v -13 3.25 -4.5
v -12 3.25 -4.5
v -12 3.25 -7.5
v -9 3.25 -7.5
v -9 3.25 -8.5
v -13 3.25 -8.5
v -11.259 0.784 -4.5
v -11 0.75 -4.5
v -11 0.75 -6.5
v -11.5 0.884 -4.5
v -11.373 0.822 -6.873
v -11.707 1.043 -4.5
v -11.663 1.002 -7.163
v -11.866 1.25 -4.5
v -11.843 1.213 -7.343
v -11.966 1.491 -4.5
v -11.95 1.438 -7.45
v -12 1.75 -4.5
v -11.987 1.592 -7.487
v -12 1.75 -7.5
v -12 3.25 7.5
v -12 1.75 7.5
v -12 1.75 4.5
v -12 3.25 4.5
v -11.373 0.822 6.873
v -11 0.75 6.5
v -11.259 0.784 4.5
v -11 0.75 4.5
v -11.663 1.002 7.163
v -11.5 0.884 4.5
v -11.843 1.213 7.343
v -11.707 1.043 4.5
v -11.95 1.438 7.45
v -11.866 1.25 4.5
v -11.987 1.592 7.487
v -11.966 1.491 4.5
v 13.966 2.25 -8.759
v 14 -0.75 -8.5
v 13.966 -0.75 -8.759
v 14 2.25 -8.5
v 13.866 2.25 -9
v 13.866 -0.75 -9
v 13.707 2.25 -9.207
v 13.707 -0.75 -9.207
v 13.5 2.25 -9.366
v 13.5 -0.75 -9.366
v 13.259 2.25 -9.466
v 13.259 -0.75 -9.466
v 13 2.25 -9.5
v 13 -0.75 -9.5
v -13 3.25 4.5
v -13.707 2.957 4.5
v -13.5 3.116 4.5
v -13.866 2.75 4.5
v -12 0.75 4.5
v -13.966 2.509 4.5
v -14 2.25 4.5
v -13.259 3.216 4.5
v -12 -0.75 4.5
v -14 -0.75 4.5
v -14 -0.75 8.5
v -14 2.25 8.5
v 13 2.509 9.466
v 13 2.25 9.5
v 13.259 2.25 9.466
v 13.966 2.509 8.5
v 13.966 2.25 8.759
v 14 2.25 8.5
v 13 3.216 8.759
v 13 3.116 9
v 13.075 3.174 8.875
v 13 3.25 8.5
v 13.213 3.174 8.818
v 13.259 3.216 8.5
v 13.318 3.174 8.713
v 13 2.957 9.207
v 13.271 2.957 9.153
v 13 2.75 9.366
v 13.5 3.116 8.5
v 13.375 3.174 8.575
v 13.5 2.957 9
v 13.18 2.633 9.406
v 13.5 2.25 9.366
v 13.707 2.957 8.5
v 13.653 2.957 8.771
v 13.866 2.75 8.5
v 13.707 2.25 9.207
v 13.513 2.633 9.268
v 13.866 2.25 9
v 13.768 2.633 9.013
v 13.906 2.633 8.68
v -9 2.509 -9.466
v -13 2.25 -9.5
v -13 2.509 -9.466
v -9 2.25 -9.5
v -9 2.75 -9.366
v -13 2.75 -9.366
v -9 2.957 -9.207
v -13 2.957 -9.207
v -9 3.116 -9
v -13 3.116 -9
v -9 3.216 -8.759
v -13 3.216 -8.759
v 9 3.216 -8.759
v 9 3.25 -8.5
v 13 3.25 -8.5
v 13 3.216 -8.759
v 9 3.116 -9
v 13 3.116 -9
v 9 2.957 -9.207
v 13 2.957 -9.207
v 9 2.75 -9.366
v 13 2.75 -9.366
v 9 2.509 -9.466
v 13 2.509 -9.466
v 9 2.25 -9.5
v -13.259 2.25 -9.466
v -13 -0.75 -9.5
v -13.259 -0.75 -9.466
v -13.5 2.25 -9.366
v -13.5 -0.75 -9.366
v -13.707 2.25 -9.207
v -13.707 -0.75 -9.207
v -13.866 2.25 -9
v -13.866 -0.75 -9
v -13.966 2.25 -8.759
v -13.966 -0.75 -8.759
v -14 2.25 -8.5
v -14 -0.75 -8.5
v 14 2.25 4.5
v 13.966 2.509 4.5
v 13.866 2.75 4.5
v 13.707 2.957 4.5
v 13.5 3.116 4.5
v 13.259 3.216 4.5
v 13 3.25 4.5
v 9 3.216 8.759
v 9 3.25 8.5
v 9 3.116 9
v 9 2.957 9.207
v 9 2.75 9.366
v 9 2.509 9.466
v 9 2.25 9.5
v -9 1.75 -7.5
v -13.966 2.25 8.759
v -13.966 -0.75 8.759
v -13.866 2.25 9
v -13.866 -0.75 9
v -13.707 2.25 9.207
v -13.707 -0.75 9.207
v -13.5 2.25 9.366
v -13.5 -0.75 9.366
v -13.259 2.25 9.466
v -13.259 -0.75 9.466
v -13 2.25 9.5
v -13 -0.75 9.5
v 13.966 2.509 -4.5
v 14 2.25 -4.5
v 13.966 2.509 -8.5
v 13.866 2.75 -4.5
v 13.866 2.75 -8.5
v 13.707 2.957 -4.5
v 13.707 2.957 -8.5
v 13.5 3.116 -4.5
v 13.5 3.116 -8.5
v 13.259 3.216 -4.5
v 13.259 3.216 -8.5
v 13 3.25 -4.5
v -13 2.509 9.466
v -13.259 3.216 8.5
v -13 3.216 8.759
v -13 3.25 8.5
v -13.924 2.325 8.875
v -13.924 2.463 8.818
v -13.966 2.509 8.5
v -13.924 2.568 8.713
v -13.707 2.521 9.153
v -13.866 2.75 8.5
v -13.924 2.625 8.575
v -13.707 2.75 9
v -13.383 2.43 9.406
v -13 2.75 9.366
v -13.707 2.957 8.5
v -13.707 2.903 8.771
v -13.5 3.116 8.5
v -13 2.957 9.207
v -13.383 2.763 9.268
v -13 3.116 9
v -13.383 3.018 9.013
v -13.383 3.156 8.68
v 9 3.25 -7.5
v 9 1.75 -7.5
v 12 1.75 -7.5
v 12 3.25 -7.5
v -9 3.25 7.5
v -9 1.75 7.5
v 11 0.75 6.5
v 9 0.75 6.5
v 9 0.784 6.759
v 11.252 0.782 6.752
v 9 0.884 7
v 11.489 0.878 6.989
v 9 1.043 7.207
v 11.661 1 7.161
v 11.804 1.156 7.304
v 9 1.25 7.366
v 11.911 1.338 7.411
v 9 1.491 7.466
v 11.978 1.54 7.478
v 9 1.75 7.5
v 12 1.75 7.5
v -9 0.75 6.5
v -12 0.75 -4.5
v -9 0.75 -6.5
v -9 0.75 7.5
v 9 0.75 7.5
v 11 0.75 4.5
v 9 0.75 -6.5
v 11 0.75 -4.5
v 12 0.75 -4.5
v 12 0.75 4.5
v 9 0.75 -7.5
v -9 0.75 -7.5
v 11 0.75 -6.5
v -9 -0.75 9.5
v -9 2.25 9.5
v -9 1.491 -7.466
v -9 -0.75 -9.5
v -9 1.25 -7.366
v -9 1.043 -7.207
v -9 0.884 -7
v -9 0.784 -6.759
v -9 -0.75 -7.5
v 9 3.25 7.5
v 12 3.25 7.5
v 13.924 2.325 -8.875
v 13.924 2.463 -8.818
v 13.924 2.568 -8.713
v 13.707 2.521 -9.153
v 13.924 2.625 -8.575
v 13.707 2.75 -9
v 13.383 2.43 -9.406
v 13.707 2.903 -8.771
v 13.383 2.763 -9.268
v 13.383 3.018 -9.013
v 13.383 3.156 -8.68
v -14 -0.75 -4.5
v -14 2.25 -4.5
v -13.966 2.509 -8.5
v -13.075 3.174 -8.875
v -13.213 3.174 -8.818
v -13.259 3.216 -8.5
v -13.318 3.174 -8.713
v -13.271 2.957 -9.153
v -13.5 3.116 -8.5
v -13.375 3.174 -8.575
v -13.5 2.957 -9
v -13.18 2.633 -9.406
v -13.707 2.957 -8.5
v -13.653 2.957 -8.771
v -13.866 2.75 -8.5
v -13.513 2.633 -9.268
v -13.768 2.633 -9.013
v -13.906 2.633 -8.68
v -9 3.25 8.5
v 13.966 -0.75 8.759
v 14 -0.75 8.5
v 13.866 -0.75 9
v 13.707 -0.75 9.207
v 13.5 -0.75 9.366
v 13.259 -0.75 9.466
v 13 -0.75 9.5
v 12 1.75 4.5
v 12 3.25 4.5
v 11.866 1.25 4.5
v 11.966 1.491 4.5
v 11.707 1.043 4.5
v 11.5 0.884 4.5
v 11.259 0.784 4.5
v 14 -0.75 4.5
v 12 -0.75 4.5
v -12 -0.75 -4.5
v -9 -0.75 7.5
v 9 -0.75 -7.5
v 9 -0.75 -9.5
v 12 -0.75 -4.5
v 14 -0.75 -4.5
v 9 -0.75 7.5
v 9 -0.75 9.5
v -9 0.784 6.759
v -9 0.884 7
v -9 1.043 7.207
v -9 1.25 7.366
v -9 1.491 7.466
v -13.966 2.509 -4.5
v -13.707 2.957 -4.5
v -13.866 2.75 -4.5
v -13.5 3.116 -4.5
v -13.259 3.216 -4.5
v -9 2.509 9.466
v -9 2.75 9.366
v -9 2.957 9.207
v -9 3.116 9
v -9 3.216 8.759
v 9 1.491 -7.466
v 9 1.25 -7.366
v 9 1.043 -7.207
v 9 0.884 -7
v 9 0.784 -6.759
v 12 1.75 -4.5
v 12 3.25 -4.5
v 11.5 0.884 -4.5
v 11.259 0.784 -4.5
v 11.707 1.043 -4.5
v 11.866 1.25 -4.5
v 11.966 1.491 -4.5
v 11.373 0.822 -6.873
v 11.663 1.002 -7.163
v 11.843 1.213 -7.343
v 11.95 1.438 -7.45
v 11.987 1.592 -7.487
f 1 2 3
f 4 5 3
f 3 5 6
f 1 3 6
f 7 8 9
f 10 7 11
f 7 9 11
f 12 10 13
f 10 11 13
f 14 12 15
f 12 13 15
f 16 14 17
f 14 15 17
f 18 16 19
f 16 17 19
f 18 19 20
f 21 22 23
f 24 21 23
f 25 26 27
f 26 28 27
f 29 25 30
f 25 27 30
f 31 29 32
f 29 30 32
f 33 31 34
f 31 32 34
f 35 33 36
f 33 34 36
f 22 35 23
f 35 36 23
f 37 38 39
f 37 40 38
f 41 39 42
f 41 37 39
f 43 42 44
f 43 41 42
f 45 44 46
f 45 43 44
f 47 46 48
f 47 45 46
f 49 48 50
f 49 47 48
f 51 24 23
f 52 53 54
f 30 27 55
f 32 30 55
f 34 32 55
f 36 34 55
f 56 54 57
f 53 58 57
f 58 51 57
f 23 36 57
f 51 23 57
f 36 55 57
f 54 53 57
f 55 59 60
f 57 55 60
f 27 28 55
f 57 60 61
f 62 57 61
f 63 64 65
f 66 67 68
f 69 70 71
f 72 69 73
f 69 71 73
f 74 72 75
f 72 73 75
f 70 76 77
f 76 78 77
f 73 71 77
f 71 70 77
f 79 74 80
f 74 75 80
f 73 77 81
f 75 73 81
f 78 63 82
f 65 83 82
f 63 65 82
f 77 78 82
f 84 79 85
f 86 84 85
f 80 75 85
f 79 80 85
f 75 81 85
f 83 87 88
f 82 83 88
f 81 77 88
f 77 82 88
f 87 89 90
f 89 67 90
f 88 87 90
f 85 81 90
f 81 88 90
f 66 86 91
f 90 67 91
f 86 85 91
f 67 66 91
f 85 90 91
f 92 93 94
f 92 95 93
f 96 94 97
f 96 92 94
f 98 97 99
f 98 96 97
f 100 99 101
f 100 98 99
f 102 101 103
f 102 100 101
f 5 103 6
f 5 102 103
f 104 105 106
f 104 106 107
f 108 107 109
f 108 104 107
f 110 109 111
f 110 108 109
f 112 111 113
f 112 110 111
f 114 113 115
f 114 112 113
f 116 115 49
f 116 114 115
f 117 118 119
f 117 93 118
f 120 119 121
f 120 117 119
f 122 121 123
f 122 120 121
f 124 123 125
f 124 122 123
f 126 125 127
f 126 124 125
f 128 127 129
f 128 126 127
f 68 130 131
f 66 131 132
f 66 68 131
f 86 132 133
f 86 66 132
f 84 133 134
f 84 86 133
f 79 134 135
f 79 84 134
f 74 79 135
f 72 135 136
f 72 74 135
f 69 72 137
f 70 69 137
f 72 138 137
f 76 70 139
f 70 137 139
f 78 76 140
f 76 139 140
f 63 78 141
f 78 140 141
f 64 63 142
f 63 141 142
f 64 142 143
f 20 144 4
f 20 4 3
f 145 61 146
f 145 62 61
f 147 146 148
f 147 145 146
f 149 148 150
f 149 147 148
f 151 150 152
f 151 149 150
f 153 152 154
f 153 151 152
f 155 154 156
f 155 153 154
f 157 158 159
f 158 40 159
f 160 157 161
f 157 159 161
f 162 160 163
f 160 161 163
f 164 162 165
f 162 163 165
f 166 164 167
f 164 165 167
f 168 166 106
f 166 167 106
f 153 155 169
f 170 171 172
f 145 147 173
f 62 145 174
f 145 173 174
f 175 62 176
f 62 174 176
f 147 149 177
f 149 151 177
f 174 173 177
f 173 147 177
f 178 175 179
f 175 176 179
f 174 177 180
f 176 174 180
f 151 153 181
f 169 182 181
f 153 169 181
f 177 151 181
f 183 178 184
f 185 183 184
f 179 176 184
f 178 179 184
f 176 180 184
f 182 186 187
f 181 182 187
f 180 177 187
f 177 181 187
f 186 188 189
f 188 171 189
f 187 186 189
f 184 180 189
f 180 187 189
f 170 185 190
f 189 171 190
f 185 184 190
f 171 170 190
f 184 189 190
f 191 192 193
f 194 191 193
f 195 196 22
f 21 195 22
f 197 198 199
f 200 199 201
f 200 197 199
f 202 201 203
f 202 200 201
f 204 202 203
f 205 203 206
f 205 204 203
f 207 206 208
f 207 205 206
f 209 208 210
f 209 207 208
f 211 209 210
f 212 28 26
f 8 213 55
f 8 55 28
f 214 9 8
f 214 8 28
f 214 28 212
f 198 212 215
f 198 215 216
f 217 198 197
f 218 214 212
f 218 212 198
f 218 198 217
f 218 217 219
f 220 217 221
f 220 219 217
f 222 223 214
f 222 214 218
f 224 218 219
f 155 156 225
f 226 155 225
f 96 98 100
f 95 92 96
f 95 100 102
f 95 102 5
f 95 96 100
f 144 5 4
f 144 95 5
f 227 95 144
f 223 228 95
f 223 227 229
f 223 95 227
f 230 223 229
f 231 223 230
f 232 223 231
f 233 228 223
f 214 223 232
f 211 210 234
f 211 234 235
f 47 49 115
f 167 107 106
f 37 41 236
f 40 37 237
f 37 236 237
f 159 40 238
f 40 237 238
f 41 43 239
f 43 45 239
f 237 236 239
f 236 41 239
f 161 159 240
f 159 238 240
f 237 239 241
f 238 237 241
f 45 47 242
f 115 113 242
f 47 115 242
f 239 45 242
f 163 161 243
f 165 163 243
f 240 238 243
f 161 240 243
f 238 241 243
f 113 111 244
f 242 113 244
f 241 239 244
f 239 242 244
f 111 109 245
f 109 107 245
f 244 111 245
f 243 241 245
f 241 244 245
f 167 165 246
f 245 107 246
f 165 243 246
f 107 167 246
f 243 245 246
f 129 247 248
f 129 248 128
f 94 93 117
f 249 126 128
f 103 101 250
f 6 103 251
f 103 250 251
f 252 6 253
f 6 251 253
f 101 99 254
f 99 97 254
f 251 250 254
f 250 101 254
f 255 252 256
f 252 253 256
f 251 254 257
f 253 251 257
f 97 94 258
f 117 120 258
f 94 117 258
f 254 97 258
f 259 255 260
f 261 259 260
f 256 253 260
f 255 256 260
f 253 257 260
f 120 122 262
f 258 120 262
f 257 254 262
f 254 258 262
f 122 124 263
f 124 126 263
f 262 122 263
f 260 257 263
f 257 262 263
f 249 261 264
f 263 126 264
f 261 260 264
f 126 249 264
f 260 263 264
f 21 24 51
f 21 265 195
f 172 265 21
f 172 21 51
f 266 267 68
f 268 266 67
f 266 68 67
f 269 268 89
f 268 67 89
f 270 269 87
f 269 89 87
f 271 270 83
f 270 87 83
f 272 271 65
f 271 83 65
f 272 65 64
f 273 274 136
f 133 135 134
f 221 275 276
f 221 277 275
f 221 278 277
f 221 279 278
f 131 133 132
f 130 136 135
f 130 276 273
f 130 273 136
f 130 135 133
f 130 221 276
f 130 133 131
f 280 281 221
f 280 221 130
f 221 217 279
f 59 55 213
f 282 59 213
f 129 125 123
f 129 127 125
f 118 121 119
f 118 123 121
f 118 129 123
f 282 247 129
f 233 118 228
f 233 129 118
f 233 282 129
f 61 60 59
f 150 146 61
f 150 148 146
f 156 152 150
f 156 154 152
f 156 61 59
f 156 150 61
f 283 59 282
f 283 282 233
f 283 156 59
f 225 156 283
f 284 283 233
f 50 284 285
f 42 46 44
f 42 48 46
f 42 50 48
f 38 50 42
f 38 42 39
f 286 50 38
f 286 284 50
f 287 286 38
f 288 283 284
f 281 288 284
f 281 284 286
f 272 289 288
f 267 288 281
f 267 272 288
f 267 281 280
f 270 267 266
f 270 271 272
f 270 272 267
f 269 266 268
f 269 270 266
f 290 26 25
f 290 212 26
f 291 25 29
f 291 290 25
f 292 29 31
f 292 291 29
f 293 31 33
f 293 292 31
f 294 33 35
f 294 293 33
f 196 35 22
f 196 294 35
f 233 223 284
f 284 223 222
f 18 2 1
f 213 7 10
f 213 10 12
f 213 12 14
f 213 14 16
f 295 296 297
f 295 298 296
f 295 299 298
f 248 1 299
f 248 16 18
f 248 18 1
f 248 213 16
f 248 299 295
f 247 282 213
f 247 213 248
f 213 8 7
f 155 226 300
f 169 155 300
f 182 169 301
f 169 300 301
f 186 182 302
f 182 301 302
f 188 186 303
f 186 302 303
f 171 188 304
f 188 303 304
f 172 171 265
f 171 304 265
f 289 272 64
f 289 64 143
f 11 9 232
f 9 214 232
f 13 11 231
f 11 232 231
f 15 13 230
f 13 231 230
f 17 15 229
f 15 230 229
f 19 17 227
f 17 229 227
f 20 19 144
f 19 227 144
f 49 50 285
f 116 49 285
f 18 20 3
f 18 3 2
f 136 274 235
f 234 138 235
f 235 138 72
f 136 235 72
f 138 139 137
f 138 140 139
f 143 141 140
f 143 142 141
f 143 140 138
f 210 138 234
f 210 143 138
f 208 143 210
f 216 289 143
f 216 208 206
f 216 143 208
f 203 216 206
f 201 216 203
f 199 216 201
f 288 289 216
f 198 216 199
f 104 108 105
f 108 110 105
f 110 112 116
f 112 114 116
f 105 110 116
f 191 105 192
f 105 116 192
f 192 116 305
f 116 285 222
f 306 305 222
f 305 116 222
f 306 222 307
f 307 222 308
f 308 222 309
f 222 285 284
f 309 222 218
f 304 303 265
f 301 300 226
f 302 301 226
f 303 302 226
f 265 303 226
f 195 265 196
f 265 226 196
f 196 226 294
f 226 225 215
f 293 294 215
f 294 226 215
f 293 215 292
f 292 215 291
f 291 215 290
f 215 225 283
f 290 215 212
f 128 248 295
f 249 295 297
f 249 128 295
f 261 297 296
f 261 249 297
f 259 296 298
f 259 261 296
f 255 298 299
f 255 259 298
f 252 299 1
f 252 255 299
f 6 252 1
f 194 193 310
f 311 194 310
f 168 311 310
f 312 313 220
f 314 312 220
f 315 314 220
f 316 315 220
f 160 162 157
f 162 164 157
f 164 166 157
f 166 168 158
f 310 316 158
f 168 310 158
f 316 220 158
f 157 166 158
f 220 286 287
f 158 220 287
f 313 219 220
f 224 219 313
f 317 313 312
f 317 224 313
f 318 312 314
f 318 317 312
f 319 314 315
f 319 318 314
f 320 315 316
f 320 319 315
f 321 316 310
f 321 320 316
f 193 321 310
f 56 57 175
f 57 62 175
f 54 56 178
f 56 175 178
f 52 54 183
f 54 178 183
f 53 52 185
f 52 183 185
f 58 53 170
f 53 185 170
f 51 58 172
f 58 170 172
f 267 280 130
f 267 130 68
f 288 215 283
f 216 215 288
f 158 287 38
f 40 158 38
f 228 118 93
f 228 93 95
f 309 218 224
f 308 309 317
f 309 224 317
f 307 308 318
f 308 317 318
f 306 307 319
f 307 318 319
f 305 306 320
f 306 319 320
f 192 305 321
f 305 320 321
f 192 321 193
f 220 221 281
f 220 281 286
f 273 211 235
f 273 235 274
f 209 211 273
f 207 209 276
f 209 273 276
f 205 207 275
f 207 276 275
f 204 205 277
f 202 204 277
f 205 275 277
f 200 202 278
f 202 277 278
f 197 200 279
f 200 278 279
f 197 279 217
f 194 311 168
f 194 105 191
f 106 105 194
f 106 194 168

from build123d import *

# Parameters (mm, degrees)
SKETCH1_W            = 24
SKETCH1_H            = 15
BOSS_EXTRUDE1_DEPTH  = 0.75
BOSS_EXTRUDE2_START  = -1.5
BOSS_EXTRUDE2_DEPTH  = 4
MIRROR2_START        = -1.5
MIRROR2_COPY_1_DEPTH = 4
FILLET1_R            = 1


with BuildPart() as part:
    # Sketch1 → Boss-Extrude1 (new, symmetric)
    with BuildSketch(Plane(origin=(0, 0, 0), x_dir=(1, 0, 0), z_dir=(0, 1, 0))):
        Rectangle(SKETCH1_W, SKETCH1_H)
    extrude(amount=BOSS_EXTRUDE1_DEPTH, both=True)

    # Sketch2 → Boss-Extrude2 (add)
    with BuildSketch(Plane(origin=(0, 0.75, 0), x_dir=(1, 0, 0), z_dir=(0, 1, 0)).offset(BOSS_EXTRUDE2_START)):
        Polygon((-12, 4.5), (-14, 4.5), (-14, 9.5), (-9, 9.5), (-9, 7.5), (-12, 7.5), align=None)
    boss_extrude2 = extrude(amount=BOSS_EXTRUDE2_DEPTH)

    # Mirror1: Boss-Extrude2 across plane
    add(boss_extrude2.mirror(Plane(origin=(0, 0, 0), x_dir=(0, 0, 1), z_dir=(1, 0, 0))))

    # Mirror2: Boss-Extrude2 across plane
    add(boss_extrude2.mirror(Plane.XY))

    # Mirror2 copy 1 sketch → Mirror2 copy 1 (add)
    with BuildSketch(Plane(origin=(0, 0.75, 0), x_dir=(-1, 0, 0), z_dir=(0, 1, 0)).offset(MIRROR2_START)):
        Polygon((-12, 4.5), (-14, 4.5), (-14, 9.5), (-9, 9.5), (-9, 7.5), (-12, 7.5), align=None)
    extrude(amount=MIRROR2_COPY_1_DEPTH)

    # Fillet1
    fillet1_edges = [part.edges().sort_by_distance(p)[0] for p in [
        (12, 0.75, 6),
        (-10.5, 0.75, -7.5),
        (10.5, 0.75, -7.5),
        (-14, 1.25, -9.5),
        (-11.5, 3.25, -9.5),
        (-14, 3.25, -7),
        (12, 0.75, -6),
        (11.5, 3.25, -9.5),
        (14, 1.25, -9.5),
        (14, 3.25, -7),
        (-12, 0.75, -6),
        (-12, 0.75, 6),
        (-11.5, 3.25, 9.5),
        (-14, 1.25, 9.5),
        (-14, 3.25, 7),
        (10.5, 0.75, 7.5),
        (14, 1.25, 9.5),
        (11.5, 3.25, 9.5),
        (14, 3.25, 7),
        (-10.5, 0.75, 7.5),
    ]]
    fillet(fillet1_edges, radius=FILLET1_R)


solid = part.part
